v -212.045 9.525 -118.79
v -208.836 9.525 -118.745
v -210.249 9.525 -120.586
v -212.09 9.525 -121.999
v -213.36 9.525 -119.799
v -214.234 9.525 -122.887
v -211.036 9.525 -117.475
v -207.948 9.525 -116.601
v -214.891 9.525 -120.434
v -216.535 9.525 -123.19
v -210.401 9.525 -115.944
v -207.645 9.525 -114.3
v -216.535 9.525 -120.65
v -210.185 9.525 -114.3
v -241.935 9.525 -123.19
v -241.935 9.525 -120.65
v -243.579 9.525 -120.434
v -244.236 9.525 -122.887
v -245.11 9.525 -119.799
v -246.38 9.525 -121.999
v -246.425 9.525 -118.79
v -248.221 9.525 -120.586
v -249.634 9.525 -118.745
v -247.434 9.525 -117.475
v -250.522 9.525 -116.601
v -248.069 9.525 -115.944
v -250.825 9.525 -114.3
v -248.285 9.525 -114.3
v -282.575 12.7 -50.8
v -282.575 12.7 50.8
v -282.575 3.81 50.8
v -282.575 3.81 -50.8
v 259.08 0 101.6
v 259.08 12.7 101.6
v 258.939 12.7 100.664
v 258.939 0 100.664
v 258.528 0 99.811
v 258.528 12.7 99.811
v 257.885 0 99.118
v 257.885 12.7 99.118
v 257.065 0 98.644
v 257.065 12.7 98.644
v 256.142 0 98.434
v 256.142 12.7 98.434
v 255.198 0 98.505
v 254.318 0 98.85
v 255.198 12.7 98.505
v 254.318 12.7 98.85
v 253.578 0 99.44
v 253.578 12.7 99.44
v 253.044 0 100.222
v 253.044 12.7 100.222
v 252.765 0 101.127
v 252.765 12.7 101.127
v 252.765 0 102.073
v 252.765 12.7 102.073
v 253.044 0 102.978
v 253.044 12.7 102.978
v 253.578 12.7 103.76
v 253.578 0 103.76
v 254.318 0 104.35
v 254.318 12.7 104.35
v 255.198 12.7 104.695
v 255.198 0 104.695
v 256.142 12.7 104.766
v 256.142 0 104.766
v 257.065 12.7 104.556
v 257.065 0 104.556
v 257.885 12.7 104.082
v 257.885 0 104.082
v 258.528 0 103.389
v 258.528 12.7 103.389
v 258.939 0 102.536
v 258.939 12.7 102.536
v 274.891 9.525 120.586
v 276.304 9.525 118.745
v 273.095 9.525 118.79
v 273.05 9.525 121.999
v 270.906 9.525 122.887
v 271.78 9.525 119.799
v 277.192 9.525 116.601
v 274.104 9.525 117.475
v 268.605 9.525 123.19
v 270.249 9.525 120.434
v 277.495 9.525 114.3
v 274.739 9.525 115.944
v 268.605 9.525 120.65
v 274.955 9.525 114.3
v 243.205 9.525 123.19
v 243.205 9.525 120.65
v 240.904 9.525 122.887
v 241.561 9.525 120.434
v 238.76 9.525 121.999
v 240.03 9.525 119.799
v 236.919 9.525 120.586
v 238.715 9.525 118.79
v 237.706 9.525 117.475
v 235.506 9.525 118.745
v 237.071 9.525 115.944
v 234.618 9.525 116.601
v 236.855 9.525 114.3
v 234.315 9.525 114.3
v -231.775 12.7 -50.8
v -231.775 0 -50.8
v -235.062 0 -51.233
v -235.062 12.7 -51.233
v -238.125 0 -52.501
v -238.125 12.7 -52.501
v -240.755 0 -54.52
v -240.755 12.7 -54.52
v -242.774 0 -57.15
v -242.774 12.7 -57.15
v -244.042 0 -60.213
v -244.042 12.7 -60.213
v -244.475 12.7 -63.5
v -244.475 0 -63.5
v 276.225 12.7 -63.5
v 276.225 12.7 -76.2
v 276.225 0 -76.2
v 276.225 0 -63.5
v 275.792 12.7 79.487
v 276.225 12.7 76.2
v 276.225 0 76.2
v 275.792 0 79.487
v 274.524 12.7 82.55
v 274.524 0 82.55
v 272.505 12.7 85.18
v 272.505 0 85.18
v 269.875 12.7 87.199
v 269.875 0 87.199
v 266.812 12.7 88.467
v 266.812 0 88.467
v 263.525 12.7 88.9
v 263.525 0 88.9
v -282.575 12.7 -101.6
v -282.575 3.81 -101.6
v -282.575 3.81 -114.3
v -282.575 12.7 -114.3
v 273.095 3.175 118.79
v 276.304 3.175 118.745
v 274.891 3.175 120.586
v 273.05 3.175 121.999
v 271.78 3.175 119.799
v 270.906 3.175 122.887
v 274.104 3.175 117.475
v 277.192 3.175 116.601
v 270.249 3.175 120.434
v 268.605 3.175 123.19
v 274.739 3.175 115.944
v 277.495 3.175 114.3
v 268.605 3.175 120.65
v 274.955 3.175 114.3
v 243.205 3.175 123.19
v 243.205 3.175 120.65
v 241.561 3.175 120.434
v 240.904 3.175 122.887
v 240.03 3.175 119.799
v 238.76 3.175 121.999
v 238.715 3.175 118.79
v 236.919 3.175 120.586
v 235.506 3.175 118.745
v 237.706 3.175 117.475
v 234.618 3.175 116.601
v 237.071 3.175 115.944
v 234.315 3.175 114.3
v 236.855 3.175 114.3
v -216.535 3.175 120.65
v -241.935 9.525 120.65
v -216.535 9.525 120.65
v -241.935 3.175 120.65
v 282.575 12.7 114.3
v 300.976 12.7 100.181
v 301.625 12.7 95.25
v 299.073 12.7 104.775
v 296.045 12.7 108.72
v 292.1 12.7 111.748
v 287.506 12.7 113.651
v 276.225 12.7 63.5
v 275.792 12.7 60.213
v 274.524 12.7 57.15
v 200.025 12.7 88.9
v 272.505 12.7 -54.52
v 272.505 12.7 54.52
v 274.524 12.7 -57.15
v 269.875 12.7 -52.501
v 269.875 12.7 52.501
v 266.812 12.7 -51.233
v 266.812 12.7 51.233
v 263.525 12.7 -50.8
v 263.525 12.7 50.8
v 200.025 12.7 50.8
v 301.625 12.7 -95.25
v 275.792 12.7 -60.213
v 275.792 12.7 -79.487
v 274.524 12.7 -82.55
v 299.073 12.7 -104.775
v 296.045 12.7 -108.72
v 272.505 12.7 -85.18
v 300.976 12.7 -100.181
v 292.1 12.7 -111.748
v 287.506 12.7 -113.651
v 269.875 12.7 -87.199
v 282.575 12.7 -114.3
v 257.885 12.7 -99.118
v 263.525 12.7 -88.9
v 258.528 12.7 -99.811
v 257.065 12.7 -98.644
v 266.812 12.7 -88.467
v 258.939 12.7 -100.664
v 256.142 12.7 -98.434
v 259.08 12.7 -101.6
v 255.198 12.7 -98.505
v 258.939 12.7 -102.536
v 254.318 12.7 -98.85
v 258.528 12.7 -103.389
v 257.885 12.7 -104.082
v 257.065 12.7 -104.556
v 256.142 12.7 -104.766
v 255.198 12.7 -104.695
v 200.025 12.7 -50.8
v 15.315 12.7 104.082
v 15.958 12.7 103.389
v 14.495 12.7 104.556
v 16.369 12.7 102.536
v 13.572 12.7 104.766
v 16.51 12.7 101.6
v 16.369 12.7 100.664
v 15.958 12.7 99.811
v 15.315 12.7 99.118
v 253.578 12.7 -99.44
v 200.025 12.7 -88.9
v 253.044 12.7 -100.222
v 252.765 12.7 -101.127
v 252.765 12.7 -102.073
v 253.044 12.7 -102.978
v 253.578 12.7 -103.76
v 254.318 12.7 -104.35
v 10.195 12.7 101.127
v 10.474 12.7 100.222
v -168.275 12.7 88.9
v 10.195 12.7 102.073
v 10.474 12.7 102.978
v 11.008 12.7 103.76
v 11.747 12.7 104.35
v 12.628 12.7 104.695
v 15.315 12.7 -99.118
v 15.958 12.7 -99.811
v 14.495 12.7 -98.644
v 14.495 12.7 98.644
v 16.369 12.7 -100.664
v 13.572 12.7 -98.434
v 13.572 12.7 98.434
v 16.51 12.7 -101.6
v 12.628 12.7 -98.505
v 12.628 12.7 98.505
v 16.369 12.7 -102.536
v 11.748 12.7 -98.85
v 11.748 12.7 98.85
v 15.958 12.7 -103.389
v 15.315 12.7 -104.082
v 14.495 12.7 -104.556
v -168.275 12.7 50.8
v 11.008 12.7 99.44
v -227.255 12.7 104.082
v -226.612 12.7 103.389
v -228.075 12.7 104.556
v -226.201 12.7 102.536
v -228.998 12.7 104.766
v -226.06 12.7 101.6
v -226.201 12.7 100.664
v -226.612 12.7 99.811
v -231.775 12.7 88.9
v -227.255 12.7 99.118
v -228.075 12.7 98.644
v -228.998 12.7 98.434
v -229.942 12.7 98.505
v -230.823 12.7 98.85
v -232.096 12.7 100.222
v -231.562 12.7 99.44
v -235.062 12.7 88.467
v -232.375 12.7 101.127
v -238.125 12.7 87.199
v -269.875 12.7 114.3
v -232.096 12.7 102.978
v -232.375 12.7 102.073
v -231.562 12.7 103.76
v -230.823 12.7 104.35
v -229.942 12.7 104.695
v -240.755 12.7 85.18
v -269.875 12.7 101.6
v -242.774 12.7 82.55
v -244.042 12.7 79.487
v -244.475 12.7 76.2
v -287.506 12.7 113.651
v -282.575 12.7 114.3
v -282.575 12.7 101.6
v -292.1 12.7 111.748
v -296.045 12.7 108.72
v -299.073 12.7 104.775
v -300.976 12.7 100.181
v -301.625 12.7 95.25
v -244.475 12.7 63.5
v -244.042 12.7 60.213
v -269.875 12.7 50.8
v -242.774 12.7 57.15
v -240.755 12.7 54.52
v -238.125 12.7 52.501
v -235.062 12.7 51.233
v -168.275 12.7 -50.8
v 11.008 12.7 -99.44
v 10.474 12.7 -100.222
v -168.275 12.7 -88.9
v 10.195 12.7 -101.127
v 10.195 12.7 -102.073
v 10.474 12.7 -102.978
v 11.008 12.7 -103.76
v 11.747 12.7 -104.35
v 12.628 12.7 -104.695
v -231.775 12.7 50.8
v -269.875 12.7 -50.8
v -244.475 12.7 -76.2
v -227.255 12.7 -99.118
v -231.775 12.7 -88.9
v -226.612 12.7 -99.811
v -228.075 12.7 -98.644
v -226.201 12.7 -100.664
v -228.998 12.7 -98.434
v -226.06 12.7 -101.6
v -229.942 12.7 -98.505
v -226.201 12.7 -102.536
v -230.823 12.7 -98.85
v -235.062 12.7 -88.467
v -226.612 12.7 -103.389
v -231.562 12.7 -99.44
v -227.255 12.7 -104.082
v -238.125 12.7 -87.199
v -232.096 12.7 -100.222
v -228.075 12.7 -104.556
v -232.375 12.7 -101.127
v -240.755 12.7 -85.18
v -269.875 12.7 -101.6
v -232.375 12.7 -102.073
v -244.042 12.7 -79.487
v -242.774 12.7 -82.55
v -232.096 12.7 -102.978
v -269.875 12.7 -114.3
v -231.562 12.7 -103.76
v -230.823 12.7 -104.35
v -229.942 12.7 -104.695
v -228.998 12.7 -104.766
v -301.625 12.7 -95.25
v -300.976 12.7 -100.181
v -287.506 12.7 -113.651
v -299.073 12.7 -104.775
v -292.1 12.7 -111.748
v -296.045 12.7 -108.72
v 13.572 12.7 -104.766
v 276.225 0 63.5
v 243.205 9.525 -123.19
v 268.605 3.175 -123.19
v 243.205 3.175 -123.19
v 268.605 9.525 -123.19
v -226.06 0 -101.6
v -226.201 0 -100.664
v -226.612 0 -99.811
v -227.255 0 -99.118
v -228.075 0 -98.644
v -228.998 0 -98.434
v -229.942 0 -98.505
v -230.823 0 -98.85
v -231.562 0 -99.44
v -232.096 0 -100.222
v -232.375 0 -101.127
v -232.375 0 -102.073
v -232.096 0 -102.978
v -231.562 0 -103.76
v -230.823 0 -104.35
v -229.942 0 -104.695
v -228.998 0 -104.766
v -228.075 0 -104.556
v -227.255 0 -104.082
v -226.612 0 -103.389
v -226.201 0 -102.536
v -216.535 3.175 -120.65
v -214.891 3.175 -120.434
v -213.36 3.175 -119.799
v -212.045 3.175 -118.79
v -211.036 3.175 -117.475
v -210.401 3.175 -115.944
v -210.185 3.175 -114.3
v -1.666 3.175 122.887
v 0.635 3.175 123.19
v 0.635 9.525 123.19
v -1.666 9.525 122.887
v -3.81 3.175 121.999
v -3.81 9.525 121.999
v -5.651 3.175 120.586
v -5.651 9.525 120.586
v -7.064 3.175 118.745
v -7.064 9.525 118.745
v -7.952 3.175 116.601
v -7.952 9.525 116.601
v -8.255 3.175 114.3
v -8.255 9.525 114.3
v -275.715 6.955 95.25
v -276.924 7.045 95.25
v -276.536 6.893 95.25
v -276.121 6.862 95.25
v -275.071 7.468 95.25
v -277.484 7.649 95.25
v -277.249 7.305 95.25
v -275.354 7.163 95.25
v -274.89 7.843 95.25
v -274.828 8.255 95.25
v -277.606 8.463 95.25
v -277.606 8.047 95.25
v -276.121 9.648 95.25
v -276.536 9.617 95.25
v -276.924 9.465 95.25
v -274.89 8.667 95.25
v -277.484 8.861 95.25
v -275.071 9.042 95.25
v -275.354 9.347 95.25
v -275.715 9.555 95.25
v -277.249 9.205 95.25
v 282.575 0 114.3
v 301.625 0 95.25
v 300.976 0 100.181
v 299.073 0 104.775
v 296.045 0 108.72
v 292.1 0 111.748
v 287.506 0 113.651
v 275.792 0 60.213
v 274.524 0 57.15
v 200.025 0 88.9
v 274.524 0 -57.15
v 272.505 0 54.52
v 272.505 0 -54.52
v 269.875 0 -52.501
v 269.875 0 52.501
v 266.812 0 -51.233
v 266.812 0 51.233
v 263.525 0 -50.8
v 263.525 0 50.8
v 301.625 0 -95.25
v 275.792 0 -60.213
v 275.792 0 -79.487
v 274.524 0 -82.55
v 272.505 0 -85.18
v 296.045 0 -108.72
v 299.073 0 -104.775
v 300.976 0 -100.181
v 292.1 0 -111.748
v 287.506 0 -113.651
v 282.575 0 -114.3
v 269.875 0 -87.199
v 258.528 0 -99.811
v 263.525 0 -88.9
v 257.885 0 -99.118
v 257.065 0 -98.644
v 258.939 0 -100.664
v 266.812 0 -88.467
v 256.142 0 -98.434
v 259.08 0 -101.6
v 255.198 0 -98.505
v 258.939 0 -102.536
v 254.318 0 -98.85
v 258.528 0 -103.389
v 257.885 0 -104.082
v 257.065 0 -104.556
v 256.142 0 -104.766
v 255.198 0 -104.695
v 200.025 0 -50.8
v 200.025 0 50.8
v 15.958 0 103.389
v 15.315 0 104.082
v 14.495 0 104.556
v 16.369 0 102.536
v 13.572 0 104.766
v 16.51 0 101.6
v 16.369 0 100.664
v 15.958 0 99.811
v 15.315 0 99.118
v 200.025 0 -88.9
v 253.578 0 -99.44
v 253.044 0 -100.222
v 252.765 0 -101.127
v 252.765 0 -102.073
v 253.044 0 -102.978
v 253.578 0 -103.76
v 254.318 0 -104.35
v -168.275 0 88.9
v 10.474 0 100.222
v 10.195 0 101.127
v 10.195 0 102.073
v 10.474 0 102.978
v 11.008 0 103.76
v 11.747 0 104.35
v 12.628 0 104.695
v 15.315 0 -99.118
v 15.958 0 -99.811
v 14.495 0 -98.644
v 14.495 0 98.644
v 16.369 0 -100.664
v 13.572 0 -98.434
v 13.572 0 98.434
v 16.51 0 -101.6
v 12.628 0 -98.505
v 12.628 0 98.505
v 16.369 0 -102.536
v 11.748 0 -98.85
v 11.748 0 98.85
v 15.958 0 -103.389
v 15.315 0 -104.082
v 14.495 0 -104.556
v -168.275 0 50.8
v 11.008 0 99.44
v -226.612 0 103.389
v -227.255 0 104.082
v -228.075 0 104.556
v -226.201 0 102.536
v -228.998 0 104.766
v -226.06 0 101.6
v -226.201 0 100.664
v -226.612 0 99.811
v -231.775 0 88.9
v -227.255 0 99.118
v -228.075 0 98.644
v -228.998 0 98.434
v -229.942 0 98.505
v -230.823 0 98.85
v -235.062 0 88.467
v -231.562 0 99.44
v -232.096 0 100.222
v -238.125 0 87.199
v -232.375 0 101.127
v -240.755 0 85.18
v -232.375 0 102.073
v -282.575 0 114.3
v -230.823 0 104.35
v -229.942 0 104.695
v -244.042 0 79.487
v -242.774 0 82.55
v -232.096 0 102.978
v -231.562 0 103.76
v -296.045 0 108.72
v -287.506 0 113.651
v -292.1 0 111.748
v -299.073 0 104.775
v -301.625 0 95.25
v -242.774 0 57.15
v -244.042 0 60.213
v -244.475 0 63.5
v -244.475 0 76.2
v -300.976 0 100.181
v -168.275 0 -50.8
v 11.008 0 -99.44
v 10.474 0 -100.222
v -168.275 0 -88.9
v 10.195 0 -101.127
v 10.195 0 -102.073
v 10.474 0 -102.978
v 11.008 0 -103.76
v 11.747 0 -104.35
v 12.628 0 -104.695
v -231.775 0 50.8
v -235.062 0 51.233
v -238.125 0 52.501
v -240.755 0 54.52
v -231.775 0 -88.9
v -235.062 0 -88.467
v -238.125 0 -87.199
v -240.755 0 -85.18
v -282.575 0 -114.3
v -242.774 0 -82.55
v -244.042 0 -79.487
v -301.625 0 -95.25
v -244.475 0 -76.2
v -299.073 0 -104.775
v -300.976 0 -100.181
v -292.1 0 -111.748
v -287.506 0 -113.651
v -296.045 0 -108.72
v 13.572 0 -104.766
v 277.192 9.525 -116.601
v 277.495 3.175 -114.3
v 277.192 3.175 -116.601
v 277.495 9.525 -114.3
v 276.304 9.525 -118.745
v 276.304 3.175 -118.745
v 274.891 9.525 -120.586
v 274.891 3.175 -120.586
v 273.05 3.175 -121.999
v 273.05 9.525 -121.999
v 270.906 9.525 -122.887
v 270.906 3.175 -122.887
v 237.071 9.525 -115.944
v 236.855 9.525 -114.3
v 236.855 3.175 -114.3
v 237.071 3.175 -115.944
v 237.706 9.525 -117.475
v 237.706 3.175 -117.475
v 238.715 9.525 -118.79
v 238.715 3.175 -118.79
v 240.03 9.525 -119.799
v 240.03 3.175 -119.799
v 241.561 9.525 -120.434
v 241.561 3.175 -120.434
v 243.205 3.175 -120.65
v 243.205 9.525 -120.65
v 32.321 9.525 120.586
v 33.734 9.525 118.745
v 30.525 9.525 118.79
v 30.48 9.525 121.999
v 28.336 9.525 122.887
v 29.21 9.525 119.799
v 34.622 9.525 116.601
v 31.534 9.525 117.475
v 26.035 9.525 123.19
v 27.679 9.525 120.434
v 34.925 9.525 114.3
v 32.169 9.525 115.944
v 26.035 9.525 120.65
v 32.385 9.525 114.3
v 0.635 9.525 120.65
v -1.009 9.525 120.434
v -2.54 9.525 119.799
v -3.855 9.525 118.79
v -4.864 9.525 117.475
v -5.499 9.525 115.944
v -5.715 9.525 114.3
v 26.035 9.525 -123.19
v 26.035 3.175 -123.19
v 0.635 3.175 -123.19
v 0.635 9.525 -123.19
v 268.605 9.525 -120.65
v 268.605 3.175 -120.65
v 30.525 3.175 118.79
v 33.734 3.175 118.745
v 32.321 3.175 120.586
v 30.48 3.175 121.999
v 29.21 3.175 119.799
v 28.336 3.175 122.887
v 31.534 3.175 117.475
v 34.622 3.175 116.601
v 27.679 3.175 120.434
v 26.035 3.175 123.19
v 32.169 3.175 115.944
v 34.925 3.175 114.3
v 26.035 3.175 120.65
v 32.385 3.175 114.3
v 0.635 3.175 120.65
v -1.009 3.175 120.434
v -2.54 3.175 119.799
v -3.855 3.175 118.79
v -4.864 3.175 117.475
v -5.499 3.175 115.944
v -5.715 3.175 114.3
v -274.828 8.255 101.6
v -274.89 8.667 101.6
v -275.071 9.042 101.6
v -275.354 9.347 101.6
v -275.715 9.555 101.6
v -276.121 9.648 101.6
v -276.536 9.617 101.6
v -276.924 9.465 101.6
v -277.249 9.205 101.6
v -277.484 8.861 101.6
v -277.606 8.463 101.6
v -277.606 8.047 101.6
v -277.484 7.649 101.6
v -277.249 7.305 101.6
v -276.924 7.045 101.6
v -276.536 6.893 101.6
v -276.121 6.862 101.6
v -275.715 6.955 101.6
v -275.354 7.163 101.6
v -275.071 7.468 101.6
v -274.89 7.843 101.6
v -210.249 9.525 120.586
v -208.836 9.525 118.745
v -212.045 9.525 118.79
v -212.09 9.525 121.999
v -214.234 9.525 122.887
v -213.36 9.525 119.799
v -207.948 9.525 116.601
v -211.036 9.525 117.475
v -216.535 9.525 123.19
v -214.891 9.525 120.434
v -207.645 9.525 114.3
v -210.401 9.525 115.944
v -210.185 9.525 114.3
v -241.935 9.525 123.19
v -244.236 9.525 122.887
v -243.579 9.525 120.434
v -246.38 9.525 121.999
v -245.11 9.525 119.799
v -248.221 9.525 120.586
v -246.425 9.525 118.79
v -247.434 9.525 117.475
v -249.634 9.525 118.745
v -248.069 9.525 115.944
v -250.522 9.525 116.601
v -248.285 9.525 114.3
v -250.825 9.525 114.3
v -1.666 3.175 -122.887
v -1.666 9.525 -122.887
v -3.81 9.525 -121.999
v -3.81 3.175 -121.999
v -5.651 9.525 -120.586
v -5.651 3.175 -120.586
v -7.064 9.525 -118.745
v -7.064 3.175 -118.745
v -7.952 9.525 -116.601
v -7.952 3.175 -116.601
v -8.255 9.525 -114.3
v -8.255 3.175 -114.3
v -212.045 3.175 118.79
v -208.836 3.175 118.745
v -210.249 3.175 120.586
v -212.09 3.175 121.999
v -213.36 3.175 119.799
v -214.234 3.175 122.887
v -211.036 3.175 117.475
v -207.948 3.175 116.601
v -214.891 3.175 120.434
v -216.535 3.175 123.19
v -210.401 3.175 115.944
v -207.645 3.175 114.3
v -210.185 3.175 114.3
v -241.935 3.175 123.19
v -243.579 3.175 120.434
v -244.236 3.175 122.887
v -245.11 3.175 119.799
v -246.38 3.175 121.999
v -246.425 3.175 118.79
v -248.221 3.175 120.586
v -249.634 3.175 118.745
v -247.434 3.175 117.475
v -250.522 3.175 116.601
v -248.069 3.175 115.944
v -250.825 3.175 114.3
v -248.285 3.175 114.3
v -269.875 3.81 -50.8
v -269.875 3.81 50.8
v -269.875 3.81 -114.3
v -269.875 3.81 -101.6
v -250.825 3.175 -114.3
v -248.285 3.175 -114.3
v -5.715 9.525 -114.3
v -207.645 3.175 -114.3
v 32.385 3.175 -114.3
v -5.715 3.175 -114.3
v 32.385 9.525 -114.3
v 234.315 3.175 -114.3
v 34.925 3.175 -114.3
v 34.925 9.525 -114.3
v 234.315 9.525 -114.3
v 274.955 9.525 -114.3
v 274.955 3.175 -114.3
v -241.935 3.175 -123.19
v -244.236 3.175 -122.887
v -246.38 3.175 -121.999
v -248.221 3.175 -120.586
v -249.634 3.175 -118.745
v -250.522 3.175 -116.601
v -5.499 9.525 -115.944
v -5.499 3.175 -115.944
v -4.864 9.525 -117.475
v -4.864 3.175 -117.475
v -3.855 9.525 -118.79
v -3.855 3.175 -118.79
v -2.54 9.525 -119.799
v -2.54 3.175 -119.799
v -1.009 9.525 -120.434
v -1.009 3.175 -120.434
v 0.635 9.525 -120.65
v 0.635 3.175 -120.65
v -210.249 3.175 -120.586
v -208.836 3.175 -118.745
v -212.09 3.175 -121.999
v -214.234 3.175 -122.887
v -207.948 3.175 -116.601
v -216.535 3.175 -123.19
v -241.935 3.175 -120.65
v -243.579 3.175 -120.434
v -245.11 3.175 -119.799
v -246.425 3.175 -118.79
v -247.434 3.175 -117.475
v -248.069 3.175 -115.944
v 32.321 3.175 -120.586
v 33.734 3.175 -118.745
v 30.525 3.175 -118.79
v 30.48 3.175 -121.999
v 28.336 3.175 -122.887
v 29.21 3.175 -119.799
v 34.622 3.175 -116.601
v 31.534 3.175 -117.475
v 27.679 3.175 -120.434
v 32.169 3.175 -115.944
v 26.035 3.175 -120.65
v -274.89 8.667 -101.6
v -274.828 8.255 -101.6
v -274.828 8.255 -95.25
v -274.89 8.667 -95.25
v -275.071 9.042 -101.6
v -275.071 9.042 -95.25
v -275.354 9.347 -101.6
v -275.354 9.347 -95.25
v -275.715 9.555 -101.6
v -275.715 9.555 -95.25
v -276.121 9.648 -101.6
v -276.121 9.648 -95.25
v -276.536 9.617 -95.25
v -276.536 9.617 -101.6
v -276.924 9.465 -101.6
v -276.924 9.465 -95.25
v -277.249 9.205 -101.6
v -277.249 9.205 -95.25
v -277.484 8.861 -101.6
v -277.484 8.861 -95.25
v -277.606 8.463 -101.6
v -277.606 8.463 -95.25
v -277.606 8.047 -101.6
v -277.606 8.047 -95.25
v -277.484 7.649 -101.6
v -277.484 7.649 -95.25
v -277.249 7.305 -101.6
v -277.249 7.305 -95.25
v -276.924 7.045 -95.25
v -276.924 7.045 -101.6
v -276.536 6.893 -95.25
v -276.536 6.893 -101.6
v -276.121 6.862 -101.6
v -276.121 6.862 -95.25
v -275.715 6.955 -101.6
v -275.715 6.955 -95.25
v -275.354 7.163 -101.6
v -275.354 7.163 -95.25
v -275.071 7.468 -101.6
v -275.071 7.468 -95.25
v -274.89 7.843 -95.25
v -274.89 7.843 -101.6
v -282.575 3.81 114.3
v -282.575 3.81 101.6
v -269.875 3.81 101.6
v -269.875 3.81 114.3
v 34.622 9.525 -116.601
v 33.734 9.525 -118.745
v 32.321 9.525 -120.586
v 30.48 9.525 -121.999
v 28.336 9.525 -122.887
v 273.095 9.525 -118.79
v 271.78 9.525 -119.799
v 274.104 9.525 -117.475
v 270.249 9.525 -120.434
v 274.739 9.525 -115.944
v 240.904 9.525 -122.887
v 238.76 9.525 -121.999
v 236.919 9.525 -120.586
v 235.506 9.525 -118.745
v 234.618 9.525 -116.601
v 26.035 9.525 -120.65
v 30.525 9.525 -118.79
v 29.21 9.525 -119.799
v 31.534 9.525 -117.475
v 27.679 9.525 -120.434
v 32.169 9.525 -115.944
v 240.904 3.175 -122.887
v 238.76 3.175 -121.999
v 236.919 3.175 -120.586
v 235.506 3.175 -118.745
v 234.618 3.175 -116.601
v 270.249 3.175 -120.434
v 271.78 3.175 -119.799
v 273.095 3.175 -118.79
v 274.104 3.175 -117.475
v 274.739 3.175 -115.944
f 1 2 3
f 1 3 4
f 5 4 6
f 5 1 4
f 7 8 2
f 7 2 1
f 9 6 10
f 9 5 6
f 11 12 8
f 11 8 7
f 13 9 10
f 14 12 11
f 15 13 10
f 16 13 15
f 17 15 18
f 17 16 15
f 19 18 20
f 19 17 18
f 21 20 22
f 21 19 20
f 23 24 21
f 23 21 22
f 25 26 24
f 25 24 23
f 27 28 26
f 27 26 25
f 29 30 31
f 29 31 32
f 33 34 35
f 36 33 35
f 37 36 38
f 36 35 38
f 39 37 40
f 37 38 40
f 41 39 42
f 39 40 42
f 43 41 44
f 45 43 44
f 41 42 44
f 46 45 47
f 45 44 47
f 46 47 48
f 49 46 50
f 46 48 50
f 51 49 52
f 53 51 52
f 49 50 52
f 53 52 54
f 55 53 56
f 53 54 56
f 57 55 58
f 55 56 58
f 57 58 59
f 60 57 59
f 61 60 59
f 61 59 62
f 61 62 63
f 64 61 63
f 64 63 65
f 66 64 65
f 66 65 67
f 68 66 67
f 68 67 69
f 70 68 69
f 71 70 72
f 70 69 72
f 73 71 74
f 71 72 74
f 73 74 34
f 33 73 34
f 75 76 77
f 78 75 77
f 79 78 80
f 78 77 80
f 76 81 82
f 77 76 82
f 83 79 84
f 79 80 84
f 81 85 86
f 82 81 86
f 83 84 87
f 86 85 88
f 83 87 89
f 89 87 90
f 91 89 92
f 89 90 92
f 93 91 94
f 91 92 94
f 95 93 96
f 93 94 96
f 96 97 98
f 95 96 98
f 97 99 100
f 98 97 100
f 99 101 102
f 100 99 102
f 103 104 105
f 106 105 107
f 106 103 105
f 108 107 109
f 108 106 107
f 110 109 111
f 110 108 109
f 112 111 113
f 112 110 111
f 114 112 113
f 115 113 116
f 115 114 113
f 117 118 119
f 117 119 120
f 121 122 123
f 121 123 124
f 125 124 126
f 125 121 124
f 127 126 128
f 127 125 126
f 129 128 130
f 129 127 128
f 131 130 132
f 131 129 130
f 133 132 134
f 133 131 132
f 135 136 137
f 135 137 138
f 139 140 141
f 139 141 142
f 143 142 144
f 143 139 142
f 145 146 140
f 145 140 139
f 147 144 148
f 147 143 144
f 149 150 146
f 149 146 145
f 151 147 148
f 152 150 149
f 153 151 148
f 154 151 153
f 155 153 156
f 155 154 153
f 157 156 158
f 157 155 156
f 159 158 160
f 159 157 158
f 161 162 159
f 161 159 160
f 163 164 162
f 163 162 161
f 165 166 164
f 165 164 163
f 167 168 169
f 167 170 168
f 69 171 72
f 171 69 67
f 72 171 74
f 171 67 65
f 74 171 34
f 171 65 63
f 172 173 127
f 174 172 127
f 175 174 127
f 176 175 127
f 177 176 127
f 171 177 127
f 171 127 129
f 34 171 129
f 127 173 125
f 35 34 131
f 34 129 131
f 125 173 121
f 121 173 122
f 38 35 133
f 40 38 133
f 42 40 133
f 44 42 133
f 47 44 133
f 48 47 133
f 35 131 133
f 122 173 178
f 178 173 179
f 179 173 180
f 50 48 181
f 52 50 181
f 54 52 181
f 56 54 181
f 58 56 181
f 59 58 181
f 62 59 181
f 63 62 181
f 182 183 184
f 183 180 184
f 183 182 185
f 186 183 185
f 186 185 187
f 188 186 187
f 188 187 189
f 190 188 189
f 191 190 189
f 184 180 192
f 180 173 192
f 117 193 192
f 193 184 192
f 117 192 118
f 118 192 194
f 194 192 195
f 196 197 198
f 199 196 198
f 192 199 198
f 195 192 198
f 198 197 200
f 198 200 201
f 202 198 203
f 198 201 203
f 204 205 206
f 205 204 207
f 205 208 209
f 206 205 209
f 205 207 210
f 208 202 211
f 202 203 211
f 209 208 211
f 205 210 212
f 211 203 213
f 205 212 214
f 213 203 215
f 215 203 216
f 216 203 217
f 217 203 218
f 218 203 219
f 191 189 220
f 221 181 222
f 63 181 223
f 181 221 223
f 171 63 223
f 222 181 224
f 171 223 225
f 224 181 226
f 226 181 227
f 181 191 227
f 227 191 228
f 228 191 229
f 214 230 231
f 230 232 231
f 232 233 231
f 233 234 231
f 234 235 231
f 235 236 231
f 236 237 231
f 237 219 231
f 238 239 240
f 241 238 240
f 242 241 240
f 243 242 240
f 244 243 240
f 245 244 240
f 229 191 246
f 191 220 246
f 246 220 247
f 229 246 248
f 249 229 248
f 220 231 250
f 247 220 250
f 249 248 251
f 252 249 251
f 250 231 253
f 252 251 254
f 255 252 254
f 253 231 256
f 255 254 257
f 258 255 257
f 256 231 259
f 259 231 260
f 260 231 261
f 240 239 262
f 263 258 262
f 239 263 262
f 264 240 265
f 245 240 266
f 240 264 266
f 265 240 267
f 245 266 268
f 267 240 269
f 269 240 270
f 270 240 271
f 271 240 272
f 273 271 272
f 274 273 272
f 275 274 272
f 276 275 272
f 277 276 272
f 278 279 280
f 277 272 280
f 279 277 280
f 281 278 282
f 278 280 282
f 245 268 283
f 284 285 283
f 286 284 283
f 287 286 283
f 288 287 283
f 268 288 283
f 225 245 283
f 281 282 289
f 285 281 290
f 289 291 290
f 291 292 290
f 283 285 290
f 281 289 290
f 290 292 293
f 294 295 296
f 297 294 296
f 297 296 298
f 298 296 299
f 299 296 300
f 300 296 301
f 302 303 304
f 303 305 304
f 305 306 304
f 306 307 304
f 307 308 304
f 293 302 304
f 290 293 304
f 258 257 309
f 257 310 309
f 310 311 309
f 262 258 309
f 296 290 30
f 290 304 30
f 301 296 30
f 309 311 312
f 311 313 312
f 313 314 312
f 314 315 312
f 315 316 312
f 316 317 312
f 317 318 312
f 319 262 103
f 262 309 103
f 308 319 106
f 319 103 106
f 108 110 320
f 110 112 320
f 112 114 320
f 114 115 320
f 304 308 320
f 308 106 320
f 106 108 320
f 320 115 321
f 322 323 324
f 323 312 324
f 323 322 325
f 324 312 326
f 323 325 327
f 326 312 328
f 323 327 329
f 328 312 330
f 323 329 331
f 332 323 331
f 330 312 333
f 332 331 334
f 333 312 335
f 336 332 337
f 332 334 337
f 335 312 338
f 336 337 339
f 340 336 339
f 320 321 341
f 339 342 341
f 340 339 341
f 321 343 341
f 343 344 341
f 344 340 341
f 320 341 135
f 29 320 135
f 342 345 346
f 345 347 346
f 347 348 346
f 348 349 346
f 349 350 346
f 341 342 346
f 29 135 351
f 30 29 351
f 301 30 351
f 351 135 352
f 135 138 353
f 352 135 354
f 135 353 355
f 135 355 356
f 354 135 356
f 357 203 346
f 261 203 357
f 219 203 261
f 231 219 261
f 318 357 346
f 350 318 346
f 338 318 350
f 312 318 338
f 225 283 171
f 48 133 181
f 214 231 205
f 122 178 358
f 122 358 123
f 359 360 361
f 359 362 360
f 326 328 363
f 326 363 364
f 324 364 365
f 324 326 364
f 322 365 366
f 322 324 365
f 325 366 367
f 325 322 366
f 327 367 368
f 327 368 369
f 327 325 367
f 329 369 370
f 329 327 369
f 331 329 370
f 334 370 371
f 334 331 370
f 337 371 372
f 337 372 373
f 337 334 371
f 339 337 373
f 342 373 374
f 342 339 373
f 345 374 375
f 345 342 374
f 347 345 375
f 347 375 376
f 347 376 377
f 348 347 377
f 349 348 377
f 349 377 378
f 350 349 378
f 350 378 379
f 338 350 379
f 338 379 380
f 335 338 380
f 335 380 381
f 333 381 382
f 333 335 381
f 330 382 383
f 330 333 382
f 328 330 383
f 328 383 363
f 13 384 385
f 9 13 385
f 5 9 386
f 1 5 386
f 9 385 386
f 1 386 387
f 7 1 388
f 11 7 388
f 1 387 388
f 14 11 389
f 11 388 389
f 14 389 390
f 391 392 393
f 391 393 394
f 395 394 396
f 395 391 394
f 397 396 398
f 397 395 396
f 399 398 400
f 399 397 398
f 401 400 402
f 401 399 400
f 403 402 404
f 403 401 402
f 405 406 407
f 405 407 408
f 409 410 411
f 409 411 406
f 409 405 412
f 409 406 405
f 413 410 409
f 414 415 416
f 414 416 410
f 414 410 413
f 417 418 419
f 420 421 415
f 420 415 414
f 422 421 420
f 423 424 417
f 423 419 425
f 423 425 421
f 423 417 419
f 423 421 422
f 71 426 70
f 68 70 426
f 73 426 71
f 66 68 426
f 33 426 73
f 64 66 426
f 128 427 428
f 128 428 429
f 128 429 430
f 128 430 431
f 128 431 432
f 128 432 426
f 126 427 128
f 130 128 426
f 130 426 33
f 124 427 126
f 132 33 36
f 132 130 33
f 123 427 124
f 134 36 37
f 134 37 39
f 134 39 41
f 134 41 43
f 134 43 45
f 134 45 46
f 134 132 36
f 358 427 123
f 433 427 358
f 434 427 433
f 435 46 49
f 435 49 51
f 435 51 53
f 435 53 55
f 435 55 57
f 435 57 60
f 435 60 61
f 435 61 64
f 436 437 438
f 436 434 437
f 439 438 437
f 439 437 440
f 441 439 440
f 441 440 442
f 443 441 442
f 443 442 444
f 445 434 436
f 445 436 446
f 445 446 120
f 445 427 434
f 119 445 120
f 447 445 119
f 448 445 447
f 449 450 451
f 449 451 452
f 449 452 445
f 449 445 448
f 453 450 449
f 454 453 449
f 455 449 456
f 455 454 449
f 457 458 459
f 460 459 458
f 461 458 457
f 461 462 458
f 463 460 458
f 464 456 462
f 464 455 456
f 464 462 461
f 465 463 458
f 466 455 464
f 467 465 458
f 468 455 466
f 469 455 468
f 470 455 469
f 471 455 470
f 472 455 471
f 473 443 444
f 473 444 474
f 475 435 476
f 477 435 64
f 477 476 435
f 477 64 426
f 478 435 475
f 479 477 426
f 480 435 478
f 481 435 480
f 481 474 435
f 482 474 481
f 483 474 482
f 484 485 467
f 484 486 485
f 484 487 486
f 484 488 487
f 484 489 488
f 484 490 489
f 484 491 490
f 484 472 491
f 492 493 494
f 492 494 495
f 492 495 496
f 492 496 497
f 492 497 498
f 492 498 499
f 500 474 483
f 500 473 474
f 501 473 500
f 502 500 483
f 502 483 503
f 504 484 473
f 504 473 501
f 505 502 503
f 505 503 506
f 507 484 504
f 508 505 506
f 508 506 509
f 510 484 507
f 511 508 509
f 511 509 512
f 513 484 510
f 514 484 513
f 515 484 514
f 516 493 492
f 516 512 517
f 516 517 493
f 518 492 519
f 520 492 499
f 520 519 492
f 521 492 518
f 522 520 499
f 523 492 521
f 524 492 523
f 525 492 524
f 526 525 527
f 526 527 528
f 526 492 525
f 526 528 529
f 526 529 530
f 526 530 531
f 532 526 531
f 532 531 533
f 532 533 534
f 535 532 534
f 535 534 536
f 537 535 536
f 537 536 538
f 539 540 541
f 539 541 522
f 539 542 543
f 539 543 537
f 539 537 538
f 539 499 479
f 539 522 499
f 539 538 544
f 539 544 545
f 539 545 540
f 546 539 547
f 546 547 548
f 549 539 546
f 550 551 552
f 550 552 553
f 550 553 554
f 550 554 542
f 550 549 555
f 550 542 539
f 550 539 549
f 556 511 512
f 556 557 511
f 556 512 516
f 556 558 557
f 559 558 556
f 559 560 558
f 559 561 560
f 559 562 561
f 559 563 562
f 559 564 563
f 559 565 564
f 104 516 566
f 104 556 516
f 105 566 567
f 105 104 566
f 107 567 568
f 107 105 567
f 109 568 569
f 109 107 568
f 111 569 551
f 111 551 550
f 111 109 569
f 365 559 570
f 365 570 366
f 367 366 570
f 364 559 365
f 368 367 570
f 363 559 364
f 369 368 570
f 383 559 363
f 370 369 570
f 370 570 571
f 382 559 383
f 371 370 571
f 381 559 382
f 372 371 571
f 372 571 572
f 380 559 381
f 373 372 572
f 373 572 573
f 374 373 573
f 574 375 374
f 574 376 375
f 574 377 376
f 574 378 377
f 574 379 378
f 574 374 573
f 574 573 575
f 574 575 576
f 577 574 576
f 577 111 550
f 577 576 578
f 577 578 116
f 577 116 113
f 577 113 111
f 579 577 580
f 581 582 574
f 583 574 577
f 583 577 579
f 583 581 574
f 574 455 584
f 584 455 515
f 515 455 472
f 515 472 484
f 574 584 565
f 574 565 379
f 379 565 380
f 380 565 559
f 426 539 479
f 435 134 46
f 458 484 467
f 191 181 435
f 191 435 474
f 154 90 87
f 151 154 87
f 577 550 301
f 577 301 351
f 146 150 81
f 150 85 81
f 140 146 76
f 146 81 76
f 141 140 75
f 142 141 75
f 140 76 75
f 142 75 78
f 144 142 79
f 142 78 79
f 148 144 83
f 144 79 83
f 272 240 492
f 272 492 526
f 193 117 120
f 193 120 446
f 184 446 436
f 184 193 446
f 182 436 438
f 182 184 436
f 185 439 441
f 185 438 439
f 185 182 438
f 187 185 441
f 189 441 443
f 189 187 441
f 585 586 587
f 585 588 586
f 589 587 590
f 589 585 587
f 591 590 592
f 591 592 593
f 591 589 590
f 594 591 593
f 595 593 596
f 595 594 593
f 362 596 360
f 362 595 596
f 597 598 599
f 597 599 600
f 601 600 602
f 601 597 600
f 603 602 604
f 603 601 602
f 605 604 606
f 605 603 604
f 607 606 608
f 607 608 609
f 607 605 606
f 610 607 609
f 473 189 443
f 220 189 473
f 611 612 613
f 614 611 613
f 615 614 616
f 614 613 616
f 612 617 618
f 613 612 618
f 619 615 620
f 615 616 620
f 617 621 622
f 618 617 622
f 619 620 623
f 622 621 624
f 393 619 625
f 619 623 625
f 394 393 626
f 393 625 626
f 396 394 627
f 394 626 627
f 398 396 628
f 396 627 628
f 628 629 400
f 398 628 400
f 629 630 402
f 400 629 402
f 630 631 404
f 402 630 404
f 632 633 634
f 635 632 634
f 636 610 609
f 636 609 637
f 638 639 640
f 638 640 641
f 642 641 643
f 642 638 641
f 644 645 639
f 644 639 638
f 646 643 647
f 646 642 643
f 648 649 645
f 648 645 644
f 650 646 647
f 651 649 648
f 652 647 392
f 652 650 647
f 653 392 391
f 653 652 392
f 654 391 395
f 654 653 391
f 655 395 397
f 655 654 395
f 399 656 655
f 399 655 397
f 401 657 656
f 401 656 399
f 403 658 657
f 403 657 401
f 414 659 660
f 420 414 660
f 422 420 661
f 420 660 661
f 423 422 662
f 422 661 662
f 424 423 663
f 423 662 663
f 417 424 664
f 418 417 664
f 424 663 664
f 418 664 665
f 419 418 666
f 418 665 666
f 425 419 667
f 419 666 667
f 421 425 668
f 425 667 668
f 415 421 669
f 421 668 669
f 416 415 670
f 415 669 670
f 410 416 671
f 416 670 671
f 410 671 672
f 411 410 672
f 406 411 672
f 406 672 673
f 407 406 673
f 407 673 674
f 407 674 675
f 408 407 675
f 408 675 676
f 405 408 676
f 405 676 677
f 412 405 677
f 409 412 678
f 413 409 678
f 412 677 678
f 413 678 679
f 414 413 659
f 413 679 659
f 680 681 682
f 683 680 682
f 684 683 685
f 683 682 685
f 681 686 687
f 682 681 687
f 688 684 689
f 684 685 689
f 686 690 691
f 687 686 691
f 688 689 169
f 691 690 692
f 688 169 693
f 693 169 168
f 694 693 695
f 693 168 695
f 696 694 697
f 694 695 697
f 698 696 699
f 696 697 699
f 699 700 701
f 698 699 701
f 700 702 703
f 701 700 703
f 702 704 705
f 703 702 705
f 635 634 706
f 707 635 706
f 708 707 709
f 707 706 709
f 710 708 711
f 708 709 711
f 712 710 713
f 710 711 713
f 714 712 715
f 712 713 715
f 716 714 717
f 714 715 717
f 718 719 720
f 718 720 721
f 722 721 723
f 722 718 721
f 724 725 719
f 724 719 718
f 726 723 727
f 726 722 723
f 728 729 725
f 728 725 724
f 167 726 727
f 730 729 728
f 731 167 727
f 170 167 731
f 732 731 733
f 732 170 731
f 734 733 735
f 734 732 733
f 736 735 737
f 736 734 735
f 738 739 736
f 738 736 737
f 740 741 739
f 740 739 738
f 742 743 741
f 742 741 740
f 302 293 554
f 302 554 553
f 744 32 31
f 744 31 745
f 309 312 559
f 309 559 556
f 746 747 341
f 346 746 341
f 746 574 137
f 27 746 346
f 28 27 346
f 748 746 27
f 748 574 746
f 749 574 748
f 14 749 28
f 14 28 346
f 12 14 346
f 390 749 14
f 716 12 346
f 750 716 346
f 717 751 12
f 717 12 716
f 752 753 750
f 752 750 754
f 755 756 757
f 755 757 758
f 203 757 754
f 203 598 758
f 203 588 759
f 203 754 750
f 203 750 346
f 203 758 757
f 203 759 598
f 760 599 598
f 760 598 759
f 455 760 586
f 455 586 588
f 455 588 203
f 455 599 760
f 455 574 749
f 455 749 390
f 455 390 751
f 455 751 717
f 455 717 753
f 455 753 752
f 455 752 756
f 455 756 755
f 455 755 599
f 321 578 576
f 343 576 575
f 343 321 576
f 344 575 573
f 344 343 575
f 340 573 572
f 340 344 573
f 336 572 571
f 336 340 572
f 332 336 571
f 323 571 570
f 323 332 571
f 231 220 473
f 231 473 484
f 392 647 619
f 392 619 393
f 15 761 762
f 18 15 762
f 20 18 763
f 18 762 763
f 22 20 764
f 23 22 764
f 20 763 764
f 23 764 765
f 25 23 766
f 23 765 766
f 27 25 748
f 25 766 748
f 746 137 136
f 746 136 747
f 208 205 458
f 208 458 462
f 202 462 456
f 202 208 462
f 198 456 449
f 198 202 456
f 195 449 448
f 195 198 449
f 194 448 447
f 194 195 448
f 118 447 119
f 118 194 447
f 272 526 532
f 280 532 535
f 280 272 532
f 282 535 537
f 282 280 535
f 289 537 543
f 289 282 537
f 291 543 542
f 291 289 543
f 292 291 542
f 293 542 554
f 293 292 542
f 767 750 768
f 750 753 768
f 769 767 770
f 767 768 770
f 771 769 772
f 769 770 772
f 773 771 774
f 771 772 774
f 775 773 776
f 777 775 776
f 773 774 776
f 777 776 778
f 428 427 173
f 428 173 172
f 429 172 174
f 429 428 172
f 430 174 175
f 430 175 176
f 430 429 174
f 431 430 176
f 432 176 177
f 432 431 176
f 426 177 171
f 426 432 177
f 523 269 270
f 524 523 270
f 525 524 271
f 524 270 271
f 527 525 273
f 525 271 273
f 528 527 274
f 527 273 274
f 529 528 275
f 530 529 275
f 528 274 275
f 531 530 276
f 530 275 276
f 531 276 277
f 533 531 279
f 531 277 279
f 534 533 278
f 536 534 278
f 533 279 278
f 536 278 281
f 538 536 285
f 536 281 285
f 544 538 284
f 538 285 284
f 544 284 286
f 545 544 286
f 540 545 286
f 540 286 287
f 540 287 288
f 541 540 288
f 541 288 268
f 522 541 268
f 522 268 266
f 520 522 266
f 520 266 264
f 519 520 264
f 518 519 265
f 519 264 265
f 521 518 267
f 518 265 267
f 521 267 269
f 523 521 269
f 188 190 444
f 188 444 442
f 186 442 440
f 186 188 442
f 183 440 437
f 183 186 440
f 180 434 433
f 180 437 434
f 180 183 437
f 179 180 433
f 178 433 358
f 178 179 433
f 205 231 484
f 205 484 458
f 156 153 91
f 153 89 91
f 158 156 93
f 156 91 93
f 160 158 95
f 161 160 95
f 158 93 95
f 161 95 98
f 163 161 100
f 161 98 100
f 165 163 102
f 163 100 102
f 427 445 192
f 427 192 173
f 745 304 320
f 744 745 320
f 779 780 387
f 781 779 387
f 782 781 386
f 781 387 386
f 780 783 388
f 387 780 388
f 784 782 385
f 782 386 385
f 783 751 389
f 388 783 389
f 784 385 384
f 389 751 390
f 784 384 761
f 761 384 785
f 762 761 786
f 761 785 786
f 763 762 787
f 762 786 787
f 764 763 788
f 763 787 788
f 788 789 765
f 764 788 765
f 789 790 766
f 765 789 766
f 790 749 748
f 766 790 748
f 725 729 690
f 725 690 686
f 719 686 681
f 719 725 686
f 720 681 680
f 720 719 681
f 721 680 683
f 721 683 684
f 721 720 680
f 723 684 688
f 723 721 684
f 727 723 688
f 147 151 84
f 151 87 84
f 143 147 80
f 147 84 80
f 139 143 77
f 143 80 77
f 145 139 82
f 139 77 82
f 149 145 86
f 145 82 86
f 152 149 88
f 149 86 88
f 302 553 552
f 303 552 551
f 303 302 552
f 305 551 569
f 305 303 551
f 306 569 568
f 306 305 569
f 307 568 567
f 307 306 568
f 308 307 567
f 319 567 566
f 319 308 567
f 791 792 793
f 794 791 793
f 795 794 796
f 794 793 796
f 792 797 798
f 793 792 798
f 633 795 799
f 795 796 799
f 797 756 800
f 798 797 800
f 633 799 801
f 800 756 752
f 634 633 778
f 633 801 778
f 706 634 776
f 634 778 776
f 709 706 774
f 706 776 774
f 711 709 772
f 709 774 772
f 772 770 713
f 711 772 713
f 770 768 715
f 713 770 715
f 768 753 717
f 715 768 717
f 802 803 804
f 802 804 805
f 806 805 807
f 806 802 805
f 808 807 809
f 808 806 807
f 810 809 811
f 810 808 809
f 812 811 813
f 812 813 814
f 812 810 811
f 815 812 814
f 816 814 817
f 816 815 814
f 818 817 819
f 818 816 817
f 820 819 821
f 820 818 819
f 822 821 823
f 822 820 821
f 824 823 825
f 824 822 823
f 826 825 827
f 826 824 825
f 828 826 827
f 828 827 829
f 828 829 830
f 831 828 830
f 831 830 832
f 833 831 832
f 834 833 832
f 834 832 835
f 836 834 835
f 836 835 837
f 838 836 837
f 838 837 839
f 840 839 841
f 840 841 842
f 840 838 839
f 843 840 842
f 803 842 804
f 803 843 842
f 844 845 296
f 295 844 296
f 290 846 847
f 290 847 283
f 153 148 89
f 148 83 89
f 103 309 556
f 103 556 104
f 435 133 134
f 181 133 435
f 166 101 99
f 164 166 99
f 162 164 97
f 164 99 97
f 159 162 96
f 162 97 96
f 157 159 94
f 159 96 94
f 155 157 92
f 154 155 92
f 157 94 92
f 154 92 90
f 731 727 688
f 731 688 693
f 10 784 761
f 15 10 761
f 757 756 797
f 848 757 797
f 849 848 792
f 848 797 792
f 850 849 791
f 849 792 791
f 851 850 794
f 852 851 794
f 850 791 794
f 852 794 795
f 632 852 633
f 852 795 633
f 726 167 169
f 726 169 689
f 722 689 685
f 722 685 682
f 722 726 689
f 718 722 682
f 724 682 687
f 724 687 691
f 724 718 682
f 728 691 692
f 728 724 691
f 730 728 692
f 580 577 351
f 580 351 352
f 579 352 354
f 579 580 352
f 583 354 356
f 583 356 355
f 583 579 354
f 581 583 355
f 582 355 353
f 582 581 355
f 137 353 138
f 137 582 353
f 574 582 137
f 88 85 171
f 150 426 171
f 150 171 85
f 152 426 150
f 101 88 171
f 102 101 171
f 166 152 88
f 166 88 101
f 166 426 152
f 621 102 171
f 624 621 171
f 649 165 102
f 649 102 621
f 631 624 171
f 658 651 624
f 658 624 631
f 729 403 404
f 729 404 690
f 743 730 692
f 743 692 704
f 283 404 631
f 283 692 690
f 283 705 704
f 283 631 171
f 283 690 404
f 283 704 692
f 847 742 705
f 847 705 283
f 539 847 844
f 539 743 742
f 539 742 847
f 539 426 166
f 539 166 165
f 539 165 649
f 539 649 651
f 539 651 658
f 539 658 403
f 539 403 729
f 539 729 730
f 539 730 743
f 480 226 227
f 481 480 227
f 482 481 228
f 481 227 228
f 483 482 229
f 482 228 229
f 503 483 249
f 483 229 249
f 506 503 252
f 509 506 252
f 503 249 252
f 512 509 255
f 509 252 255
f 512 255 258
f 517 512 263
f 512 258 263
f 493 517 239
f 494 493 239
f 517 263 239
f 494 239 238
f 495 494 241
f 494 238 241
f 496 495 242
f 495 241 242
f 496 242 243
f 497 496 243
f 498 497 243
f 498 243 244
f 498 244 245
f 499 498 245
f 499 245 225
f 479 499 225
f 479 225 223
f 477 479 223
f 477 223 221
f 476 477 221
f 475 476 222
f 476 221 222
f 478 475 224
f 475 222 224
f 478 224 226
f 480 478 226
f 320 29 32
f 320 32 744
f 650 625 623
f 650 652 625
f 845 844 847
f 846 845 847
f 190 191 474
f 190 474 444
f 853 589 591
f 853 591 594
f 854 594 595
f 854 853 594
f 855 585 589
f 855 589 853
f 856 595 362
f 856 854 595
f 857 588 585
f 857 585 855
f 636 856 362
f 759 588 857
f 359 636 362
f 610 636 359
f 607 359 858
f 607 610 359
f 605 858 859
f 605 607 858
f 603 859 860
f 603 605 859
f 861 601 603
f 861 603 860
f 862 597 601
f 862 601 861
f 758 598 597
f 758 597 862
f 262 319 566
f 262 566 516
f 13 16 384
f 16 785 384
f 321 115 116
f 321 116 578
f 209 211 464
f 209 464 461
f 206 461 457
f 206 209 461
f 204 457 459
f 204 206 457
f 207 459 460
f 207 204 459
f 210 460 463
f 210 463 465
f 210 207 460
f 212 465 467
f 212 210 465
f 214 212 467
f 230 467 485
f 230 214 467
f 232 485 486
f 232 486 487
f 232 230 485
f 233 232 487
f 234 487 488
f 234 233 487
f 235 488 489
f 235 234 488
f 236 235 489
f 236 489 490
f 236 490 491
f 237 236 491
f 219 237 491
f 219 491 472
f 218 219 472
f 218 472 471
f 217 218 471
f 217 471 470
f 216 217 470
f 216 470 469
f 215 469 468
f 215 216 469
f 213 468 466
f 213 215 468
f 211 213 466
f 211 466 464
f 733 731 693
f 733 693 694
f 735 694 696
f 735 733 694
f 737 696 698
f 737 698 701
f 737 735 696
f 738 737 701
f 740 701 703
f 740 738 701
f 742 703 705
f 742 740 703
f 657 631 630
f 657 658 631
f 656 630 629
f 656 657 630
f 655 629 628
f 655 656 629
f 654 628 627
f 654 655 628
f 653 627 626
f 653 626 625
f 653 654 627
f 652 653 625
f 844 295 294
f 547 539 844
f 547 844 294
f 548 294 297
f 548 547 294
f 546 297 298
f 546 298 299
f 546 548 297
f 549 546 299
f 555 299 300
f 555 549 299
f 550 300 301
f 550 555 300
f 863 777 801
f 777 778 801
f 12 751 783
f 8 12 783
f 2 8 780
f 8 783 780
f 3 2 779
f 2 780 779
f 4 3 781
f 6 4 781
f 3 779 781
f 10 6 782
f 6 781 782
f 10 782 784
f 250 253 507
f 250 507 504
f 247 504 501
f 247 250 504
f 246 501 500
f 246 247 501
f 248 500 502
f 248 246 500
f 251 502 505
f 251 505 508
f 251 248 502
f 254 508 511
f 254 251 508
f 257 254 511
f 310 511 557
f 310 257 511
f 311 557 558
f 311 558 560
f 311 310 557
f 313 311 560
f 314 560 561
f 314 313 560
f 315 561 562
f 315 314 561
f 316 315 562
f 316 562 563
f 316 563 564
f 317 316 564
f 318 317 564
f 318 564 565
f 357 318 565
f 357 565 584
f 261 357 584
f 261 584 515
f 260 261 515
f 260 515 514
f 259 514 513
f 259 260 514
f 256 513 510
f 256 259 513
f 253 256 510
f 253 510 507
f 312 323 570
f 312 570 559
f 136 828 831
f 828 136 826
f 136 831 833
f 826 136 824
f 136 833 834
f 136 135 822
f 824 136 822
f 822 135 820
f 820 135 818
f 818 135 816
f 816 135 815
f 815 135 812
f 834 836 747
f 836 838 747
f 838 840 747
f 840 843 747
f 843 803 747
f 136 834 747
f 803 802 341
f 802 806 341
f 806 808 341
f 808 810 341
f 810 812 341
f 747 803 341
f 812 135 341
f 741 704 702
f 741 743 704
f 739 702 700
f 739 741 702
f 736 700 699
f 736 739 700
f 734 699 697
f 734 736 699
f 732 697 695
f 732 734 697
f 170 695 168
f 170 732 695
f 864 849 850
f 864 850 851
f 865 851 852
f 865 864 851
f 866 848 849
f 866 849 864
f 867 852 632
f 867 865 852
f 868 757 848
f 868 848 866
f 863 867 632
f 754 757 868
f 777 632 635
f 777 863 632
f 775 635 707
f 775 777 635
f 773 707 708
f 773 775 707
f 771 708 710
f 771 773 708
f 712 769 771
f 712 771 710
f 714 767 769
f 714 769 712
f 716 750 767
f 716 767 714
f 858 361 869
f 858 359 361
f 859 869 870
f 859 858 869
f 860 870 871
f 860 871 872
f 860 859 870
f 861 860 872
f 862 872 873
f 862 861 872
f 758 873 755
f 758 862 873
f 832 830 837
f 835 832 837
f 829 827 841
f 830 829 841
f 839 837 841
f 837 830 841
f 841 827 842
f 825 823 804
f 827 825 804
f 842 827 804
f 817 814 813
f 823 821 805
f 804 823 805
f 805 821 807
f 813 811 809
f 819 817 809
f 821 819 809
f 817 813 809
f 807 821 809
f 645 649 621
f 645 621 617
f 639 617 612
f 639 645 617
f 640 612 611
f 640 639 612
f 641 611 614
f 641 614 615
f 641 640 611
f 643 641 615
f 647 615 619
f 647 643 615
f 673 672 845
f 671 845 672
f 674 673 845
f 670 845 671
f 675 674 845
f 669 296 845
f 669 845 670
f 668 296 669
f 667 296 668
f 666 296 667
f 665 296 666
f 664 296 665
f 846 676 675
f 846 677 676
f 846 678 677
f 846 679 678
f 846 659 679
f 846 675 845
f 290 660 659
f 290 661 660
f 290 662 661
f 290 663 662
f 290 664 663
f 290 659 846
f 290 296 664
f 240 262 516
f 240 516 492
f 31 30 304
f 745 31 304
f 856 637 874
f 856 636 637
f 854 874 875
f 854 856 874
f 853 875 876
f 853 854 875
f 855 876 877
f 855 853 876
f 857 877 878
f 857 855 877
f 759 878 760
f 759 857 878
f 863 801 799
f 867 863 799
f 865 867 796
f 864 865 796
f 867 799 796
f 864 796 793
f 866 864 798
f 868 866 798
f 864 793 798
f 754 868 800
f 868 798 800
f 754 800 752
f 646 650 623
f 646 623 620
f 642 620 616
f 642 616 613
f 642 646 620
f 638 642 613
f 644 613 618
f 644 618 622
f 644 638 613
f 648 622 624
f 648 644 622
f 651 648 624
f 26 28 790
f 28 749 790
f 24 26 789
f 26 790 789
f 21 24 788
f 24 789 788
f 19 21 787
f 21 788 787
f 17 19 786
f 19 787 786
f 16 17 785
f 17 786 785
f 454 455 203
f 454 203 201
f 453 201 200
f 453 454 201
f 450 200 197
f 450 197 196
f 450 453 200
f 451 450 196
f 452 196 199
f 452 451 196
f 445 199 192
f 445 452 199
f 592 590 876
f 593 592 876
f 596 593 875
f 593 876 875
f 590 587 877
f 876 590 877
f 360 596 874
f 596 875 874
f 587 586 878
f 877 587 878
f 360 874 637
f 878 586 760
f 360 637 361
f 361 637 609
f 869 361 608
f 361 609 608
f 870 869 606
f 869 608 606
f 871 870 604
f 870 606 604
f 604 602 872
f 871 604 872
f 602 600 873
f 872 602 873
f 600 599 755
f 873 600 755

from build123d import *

# Parameters (mm, degrees)
BOSS_EXTRUDE1_DEPTH     = 12.7
BACKREST_BRACKET_SLOT_W = 12.7
BACKREST_BRACKET_SLOT_H = 8.89
CUT_EXTRUDE3_DEPTH      = 12.7
BACKREST_SCREW_HOLE_R   = 1.397
CUT_EXTRUDE4_DEPTH      = 6.35
CUT_EXTRUDE5_DEPTH      = 25.4
BOSS_EXTRUDE2_DEPTH     = 3.175
SKETCH37_W              = 12.7
SKETCH37_H              = 101.6
CUT_EXTRUDE7_DEPTH      = 8.89
SKETCH38_R              = 3.175
CUT_EXTRUDE8_DEPTH      = 12.7


with BuildPart() as part:
    # Main Body → Boss-Extrude1 (new body)
    with BuildSketch(Plane(origin=(0, 0, 0), x_dir=(1, 0, 0), z_dir=(0, 1, 0))):
        with BuildLine():
            Line((-301.625, -95.25), (-301.625, 95.25))
            ThreePointArc((-301.625, 95.25), (-296.045384182, 108.720384182), (-282.575, 114.3))
            Line((-282.575, 114.3), (282.575, 114.3))
            ThreePointArc((282.575, 114.3), (296.045384182, 108.720384182), (301.625, 95.25))
            Line((301.625, 95.25), (301.625, -95.25))
            ThreePointArc((301.625, -95.25), (296.045384182, -108.720384182), (282.575, -114.3))
            Line((282.575, -114.3), (-282.575, -114.3))
            ThreePointArc((-282.575, -114.3), (-296.045384182, -108.720384182), (-301.625, -95.25))
        make_face()
    extrude(amount=BOSS_EXTRUDE1_DEPTH)

    # Backrest Bracket Slot → Cut-Extrude3 (cut)
    with BuildSketch(Plane.XY.offset(114.3)):
        with Locations((-276.225, 8.255)):
            Rectangle(BACKREST_BRACKET_SLOT_W, BACKREST_BRACKET_SLOT_H)
    cut_extrude3 = extrude(amount=-CUT_EXTRUDE3_DEPTH, mode=Mode.SUBTRACT)

    # Backrest Screw Hole → Cut-Extrude4 (cut)
    with BuildSketch(Plane.XY.offset(101.6)):
        with Locations((-276.225, 8.255)):
            Circle(BACKREST_SCREW_HOLE_R)
    cut_extrude4 = extrude(amount=-CUT_EXTRUDE4_DEPTH, mode=Mode.SUBTRACT)

    # Mirror1: Cut-Extrude3, Cut-Extrude4 across plane
    add(cut_extrude3.mirror(Plane.XY), mode=Mode.SUBTRACT)
    add(cut_extrude4.mirror(Plane.XY), mode=Mode.SUBTRACT)

    # Couch Foot Slits → Cut-Extrude5 (cut)
    with BuildSketch(Plane(origin=(0, 12.7, 0), x_dir=(1, 0, 0), z_dir=(0, 1, 0))):
        with BuildLine():
            Line((-231.775, 88.9), (-168.275, 88.9))
            Line((-168.275, 88.9), (-168.275, 50.8))
            Line((-168.275, 50.8), (-231.775, 50.8))
            ThreePointArc((-231.775, 50.8), (-240.755256121, 54.519743879), (-244.475, 63.5))
            Line((-244.475, 63.5), (-244.475, 76.2))
            ThreePointArc((-244.475, 76.2), (-240.755256121, 85.180256121), (-231.775, 88.9))
        make_face()
        with BuildLine():
            Line((276.225, 76.2), (276.225, 63.5))
            ThreePointArc((276.225, 63.5), (272.505256121, 54.519743879), (263.525, 50.8))
            Line((263.525, 50.8), (200.025, 50.8))
            Line((200.025, 50.8), (200.025, 88.9))
            Line((200.025, 88.9), (263.525, 88.9))
            ThreePointArc((263.525, 88.9), (272.505256121, 85.180256121), (276.225, 76.2))
        make_face()
        with BuildLine():
            Line((-231.775, -50.8), (-168.275, -50.8))
            Line((-168.275, -50.8), (-168.275, -88.9))
            Line((-168.275, -88.9), (-231.775, -88.9))
            ThreePointArc((-231.775, -88.9), (-240.755256121, -85.180256121), (-244.475, -76.2))
            Line((-244.475, -76.2), (-244.475, -63.5))
            ThreePointArc((-244.475, -63.5), (-240.755256121, -54.519743879), (-231.775, -50.8))
        make_face()
        with BuildLine():
            Line((276.225, -63.5), (276.225, -76.2))
            ThreePointArc((276.225, -76.2), (272.505256121, -85.180256121), (263.525, -88.9))
            Line((263.525, -88.9), (200.025, -88.9))
            Line((200.025, -88.9), (200.025, -50.8))
            Line((200.025, -50.8), (263.525, -50.8))
            ThreePointArc((263.525, -50.8), (272.505256121, -54.519743879), (276.225, -63.5))
        make_face()
    extrude(amount=-CUT_EXTRUDE5_DEPTH, mode=Mode.SUBTRACT)

    # Sketch24 → Boss-Extrude2 (add, symmetric)
    with BuildSketch(Plane(origin=(0, 6.35, 0), x_dir=(1, 0, 0), z_dir=(0, 1, 0))):
        with BuildLine():
            Line((0.635, -120.65), (26.035, -120.65))
            ThreePointArc((26.035, -120.65), (30.525128061, -118.790128061), (32.385, -114.3))
            Line((32.385, -114.3), (34.925, -114.3))
            ThreePointArc((34.925, -114.3), (32.321179285, -120.586179285), (26.035, -123.19))
            Line((26.035, -123.19), (0.635, -123.19))
            ThreePointArc((0.635, -123.19), (-5.651179285, -120.586179285), (-8.255, -114.3))
            Line((-8.255, -114.3), (-5.715, -114.3))
            ThreePointArc((-5.715, -114.3), (-3.855128061, -118.790128061), (0.635, -120.65))
        make_face()
        with BuildLine():
            Line((-241.935, -120.65), (-216.535, -120.65))
            ThreePointArc((-216.535, -120.65), (-212.044871939, -118.790128061), (-210.185, -114.3))
            Line((-210.185, -114.3), (-207.645, -114.3))
            ThreePointArc((-207.645, -114.3), (-210.248820715, -120.586179285), (-216.535, -123.19))
            Line((-216.535, -123.19), (-241.935, -123.19))
            ThreePointArc((-241.935, -123.19), (-248.221179285, -120.586179285), (-250.825, -114.3))
            Line((-250.825, -114.3), (-248.285, -114.3))
            ThreePointArc((-248.285, -114.3), (-246.425128061, -118.790128061), (-241.935, -120.65))
        make_face()
        with BuildLine():
            Line((243.205, -120.65), (268.605, -120.65))
            ThreePointArc((268.605, -120.65), (273.095128061, -118.790128061), (274.955, -114.3))
            Line((274.955, -114.3), (277.495, -114.3))
            ThreePointArc((277.495, -114.3), (274.891179285, -120.586179285), (268.605, -123.19))
            Line((268.605, -123.19), (243.205, -123.19))
            ThreePointArc((243.205, -123.19), (236.918820715, -120.586179285), (234.315, -114.3))
            Line((234.315, -114.3), (236.855, -114.3))
            ThreePointArc((236.855, -114.3), (238.714871939, -118.790128061), (243.205, -120.65))
        make_face()
    boss_extrude2 = extrude(amount=BOSS_EXTRUDE2_DEPTH, both=True)

    # Mirror2: Boss-Extrude2 across plane
    add(boss_extrude2.mirror(Plane.XY))

    # Sketch37 → Cut-Extrude7 (cut)
    with BuildSketch(Plane(origin=(0, 12.7, 0), x_dir=(1, 0, 0), z_dir=(0, 1, 0))):
        with Locations((-276.225, 0)):
            Rectangle(SKETCH37_W, SKETCH37_H)
    extrude(amount=-CUT_EXTRUDE7_DEPTH, mode=Mode.SUBTRACT)

    # Sketch38 → Cut-Extrude8 (cut)
    with BuildSketch(Plane(origin=(0, 12.7, 0), x_dir=(1, 0, 0), z_dir=(0, 1, 0))):
        with Locations((-229.235, -101.6)):
            Circle(SKETCH38_R)
        with Locations((13.335, -101.6)):
            Circle(SKETCH38_R)
        with Locations((255.905, -101.6)):
            Circle(SKETCH38_R)
    cut_extrude8 = extrude(amount=-CUT_EXTRUDE8_DEPTH, mode=Mode.SUBTRACT)

    # Mirror3: Cut-Extrude8 across plane
    add(cut_extrude8.mirror(Plane.XY), mode=Mode.SUBTRACT)


solid = part.part
